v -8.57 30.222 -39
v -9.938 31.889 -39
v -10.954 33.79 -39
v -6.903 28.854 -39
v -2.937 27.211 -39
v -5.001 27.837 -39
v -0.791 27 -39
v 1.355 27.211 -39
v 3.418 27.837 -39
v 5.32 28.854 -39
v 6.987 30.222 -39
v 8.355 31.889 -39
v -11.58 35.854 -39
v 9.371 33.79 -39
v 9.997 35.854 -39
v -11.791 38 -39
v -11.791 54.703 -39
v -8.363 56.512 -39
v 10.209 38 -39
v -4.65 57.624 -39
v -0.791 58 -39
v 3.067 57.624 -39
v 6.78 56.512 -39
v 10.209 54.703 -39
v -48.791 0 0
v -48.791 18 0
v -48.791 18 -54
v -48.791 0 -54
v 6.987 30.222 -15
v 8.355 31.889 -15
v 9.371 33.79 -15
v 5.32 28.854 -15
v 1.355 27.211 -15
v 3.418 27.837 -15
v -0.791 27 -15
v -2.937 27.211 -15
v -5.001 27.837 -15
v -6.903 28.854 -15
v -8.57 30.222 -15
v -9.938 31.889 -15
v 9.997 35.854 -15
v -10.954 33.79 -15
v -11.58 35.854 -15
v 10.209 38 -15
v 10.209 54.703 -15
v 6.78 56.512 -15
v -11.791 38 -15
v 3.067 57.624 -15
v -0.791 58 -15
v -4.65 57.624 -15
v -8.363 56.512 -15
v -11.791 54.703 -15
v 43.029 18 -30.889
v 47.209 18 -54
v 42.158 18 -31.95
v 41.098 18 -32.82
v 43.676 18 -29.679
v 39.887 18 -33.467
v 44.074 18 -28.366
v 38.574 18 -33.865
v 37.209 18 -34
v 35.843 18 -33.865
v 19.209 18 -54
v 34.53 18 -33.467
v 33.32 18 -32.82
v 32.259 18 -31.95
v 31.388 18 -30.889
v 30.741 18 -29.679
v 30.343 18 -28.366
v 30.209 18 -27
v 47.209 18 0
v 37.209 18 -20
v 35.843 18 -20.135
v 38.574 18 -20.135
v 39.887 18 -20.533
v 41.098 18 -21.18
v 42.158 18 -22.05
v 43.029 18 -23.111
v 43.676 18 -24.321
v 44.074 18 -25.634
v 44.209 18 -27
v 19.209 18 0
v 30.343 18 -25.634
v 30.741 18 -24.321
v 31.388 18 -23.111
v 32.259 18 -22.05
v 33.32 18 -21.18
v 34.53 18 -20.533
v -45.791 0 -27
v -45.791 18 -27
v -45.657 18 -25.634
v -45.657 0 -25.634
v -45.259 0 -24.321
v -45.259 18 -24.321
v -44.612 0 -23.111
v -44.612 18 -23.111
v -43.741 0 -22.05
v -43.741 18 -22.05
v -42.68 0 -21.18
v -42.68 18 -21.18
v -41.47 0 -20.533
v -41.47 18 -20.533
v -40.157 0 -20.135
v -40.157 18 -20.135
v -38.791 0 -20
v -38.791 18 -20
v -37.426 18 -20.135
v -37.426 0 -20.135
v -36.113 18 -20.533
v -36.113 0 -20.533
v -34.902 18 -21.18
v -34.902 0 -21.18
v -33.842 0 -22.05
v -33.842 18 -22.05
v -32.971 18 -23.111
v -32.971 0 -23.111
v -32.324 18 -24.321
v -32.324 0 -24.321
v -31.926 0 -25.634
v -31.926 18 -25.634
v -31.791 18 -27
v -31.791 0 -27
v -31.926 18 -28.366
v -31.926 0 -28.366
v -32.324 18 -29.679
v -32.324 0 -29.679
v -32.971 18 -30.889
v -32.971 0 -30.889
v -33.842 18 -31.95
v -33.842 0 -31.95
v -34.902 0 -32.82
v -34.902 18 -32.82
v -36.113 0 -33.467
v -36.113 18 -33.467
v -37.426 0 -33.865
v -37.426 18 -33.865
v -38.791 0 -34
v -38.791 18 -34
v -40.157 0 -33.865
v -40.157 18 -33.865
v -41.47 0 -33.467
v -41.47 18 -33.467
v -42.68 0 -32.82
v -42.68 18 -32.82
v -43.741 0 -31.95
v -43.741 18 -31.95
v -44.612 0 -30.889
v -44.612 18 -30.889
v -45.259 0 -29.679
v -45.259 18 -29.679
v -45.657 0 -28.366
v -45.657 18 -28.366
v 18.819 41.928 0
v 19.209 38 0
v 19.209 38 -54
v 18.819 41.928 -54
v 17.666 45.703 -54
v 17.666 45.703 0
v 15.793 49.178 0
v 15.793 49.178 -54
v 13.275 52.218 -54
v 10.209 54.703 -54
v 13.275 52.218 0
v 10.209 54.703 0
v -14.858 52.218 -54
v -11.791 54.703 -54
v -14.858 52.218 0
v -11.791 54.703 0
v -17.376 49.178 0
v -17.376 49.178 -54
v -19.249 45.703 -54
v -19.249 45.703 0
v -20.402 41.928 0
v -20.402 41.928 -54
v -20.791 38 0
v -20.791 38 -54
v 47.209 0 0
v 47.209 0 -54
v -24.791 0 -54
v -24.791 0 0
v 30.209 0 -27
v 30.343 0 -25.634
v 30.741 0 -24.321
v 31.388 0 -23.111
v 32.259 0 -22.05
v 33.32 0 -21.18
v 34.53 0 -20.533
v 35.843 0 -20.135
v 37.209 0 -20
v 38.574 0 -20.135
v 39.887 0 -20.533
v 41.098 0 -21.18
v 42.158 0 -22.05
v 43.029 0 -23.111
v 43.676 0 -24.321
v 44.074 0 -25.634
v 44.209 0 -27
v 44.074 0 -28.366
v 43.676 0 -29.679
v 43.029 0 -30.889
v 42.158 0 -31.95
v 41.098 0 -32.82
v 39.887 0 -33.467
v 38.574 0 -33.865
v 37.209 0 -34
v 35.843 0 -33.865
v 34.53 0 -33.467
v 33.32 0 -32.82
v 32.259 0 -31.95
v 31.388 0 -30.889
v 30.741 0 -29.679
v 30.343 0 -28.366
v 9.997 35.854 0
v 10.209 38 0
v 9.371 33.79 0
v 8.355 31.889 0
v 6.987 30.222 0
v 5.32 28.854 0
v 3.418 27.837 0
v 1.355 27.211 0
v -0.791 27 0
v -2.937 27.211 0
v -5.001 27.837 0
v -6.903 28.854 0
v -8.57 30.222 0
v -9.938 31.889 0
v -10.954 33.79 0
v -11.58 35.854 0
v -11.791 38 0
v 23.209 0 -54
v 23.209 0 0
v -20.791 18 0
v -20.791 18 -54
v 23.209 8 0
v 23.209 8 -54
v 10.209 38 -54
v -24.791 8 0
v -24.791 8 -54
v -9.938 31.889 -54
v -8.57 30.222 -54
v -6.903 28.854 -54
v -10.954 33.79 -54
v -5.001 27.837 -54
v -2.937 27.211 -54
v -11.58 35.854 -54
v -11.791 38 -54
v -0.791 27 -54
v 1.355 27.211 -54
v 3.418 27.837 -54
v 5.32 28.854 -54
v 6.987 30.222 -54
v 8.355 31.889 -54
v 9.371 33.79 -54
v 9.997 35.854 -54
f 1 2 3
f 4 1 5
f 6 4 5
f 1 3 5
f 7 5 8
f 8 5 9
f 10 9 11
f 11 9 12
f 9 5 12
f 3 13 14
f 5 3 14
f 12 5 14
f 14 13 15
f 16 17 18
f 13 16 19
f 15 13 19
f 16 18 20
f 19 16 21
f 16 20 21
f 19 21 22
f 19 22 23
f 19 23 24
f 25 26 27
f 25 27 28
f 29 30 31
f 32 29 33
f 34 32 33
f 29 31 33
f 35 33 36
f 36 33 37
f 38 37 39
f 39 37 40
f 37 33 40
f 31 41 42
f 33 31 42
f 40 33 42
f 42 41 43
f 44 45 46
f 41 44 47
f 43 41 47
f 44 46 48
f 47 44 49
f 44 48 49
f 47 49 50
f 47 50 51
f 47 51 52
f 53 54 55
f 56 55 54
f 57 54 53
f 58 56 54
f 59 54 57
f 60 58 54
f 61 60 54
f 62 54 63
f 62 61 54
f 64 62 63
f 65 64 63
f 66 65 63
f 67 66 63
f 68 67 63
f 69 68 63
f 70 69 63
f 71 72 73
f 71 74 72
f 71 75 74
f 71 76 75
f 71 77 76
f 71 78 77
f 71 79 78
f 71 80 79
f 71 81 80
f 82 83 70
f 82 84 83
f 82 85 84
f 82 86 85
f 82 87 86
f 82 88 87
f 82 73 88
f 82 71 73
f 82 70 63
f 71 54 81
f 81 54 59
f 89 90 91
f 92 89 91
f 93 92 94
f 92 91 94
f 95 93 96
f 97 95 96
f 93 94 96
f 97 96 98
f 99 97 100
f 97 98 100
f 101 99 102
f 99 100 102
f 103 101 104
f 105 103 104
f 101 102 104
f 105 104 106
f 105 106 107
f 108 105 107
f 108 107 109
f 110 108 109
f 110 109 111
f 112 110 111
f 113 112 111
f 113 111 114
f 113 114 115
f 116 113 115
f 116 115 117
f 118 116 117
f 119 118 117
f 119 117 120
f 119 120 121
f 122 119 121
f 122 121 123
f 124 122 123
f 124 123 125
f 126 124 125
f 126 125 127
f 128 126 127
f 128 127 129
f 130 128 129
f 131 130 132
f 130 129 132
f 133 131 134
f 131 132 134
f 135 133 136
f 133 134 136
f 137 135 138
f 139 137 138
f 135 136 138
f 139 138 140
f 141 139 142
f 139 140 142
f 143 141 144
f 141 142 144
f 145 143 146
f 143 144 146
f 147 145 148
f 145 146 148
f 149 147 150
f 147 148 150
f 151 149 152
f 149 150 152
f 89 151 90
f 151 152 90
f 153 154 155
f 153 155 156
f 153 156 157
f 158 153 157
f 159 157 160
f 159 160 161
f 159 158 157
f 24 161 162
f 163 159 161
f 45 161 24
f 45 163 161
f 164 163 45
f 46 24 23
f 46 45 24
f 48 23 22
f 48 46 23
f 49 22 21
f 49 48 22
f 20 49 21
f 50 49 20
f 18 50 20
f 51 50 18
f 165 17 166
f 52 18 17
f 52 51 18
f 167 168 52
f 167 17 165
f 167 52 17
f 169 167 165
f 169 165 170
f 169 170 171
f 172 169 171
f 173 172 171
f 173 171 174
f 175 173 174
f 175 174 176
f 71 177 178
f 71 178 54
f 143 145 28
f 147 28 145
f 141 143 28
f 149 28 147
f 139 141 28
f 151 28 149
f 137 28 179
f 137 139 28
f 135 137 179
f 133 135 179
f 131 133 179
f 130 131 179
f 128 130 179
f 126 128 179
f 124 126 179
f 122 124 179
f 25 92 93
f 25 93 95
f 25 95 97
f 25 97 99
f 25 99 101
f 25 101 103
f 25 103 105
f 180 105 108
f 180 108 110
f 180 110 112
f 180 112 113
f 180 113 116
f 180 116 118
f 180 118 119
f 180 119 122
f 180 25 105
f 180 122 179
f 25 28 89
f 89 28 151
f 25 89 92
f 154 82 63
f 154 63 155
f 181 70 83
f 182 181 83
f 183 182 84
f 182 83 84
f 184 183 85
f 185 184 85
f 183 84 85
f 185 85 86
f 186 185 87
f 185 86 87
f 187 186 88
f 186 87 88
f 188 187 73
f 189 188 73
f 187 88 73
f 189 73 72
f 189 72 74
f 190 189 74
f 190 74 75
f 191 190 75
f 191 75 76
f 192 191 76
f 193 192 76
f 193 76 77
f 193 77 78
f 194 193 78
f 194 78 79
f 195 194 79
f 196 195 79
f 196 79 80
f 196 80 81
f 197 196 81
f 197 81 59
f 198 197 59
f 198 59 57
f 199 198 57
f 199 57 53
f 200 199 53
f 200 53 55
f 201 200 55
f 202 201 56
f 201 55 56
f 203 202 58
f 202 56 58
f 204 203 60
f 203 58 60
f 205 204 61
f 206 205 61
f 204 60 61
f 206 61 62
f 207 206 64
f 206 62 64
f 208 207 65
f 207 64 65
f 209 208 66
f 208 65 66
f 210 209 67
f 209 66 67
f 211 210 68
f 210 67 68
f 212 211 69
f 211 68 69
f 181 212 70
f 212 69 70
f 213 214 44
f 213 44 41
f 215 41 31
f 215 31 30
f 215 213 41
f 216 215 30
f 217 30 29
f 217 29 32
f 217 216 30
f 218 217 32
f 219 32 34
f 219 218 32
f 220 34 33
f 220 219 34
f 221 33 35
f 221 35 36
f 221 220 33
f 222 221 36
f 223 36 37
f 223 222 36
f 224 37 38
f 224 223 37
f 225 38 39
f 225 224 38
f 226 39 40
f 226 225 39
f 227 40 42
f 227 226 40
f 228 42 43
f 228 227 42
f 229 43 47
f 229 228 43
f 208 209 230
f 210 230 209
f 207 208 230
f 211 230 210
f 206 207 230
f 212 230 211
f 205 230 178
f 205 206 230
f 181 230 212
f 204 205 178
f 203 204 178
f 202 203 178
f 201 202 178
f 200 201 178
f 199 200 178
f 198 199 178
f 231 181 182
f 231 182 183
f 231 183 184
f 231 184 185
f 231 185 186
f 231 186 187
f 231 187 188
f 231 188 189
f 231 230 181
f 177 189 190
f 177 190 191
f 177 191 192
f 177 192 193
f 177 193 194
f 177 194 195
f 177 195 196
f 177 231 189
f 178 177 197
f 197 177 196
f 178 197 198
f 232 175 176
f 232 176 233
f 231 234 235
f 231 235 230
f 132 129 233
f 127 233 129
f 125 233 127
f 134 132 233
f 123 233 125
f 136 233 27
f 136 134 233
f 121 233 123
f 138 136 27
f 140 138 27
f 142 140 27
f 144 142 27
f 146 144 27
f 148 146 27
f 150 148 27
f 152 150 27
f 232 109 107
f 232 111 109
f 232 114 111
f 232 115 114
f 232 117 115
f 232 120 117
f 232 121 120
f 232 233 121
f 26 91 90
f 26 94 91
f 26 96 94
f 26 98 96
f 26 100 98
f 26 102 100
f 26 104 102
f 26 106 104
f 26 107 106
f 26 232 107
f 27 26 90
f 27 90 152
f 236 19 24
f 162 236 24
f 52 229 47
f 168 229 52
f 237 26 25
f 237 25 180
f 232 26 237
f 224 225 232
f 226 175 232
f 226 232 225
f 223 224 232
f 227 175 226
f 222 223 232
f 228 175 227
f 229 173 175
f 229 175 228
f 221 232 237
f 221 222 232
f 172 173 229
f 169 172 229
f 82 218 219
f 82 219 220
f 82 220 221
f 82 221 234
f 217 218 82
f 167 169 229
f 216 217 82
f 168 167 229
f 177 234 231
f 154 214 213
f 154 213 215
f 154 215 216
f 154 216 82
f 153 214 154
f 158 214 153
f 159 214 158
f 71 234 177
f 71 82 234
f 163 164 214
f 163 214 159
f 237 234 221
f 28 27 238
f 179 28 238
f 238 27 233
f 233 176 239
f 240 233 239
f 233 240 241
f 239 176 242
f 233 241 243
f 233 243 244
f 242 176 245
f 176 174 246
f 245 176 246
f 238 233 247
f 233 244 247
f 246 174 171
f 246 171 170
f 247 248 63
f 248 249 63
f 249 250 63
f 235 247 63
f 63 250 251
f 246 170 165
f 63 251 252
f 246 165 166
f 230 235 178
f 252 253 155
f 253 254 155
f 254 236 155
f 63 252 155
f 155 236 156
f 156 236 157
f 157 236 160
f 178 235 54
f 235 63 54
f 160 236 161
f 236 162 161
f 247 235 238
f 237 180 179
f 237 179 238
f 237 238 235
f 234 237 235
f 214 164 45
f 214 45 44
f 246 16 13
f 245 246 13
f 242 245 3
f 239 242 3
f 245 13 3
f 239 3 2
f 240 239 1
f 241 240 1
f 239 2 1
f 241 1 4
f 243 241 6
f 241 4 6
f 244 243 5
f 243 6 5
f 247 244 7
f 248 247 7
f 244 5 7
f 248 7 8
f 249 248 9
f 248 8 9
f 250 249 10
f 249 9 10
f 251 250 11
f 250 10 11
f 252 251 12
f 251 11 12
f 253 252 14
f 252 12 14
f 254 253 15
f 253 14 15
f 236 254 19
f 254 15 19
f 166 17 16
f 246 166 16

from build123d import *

# Parameters (mm, degrees)
BOSS_EXTRUDE1_DEPTH = 54
SKETCH2_R           = 7
CUT_EXTRUDE1_DEPTH  = 54
CUT_EXTRUDE2_DEPTH  = 15
CUT_EXTRUDE3_START  = -15
CUT_EXTRUDE3_DEPTH  = 15


with BuildPart() as part:
    # Sketch1 → Boss-Extrude1 (new body)
    with BuildSketch(Plane.XY):
        with BuildLine():
            Line((-48.791461113, 0), (-24.791461113, 0))
            Line((-24.791461113, 0), (-24.791461113, 8))
            Line((-24.791461113, 8), (23.208538887, 8))
            Line((23.208538887, 8), (23.208538887, 0))
            Line((23.208538887, 0), (47.208538887, 0))
            Line((47.208538887, 0), (47.208538887, 18))
            Line((47.208538887, 18), (19.208538887, 18))
            Line((19.208538887, 18), (19.208538887, 38))
            ThreePointArc((19.208538887, 38), (-0.791461113, 58), (-20.791461113, 38))
            Line((-20.791461113, 38), (-20.791461113, 18))
            Line((-20.791461113, 18), (-48.791461113, 18))
            Line((-48.791461113, 18), (-48.791461113, 0))
        make_face()
    extrude(amount=-BOSS_EXTRUDE1_DEPTH)

    # Sketch2 → Cut-Extrude1 (cut)
    with BuildSketch(Plane(origin=(0, 18, 0), x_dir=(1, 0, 0), z_dir=(0, 1, 0))):
        with Locations(Location((37.208538887, 27, 0), (0, 0, 180))):
            Circle(SKETCH2_R)
        with Locations(Location((-38.791461113, 27, 0), (0, 0, 180))):
            Circle(SKETCH2_R)
    extrude(amount=-CUT_EXTRUDE1_DEPTH, mode=Mode.SUBTRACT)

    # Sketch3 → Cut-Extrude2 (cut)
    with BuildSketch(Plane.XY):
        with BuildLine():
            Line((10.208538887, 58), (10.208538887, 38))
            ThreePointArc((10.208538887, 38), (-0.791461113, 27), (-11.791461113, 38))
            Line((-11.791461113, 38), (-11.791461113, 58))
            ThreePointArc((-11.791461113, 58), (-0.791461113, 69), (10.208538887, 58))
        make_face()
    extrude(amount=-CUT_EXTRUDE2_DEPTH, mode=Mode.SUBTRACT)

    # Sketch4 → Cut-Extrude3 (cut)
    with BuildSketch(Plane(origin=(0, 0, -54), x_dir=(-1, 0, 0), z_dir=(0, 0, -1)).offset(CUT_EXTRUDE3_START)):
        with BuildLine():
            Line((11.791461113, 58), (11.791461113, 38))
            ThreePointArc((11.791461113, 38), (0.791461113, 27), (-10.208538887, 38))
            Line((-10.208538887, 38), (-10.208538887, 58))
            ThreePointArc((-10.208538887, 58), (0.791461113, 69), (11.791461113, 58))
        make_face()
    extrude(amount=CUT_EXTRUDE3_DEPTH, mode=Mode.SUBTRACT)


solid = part.part
